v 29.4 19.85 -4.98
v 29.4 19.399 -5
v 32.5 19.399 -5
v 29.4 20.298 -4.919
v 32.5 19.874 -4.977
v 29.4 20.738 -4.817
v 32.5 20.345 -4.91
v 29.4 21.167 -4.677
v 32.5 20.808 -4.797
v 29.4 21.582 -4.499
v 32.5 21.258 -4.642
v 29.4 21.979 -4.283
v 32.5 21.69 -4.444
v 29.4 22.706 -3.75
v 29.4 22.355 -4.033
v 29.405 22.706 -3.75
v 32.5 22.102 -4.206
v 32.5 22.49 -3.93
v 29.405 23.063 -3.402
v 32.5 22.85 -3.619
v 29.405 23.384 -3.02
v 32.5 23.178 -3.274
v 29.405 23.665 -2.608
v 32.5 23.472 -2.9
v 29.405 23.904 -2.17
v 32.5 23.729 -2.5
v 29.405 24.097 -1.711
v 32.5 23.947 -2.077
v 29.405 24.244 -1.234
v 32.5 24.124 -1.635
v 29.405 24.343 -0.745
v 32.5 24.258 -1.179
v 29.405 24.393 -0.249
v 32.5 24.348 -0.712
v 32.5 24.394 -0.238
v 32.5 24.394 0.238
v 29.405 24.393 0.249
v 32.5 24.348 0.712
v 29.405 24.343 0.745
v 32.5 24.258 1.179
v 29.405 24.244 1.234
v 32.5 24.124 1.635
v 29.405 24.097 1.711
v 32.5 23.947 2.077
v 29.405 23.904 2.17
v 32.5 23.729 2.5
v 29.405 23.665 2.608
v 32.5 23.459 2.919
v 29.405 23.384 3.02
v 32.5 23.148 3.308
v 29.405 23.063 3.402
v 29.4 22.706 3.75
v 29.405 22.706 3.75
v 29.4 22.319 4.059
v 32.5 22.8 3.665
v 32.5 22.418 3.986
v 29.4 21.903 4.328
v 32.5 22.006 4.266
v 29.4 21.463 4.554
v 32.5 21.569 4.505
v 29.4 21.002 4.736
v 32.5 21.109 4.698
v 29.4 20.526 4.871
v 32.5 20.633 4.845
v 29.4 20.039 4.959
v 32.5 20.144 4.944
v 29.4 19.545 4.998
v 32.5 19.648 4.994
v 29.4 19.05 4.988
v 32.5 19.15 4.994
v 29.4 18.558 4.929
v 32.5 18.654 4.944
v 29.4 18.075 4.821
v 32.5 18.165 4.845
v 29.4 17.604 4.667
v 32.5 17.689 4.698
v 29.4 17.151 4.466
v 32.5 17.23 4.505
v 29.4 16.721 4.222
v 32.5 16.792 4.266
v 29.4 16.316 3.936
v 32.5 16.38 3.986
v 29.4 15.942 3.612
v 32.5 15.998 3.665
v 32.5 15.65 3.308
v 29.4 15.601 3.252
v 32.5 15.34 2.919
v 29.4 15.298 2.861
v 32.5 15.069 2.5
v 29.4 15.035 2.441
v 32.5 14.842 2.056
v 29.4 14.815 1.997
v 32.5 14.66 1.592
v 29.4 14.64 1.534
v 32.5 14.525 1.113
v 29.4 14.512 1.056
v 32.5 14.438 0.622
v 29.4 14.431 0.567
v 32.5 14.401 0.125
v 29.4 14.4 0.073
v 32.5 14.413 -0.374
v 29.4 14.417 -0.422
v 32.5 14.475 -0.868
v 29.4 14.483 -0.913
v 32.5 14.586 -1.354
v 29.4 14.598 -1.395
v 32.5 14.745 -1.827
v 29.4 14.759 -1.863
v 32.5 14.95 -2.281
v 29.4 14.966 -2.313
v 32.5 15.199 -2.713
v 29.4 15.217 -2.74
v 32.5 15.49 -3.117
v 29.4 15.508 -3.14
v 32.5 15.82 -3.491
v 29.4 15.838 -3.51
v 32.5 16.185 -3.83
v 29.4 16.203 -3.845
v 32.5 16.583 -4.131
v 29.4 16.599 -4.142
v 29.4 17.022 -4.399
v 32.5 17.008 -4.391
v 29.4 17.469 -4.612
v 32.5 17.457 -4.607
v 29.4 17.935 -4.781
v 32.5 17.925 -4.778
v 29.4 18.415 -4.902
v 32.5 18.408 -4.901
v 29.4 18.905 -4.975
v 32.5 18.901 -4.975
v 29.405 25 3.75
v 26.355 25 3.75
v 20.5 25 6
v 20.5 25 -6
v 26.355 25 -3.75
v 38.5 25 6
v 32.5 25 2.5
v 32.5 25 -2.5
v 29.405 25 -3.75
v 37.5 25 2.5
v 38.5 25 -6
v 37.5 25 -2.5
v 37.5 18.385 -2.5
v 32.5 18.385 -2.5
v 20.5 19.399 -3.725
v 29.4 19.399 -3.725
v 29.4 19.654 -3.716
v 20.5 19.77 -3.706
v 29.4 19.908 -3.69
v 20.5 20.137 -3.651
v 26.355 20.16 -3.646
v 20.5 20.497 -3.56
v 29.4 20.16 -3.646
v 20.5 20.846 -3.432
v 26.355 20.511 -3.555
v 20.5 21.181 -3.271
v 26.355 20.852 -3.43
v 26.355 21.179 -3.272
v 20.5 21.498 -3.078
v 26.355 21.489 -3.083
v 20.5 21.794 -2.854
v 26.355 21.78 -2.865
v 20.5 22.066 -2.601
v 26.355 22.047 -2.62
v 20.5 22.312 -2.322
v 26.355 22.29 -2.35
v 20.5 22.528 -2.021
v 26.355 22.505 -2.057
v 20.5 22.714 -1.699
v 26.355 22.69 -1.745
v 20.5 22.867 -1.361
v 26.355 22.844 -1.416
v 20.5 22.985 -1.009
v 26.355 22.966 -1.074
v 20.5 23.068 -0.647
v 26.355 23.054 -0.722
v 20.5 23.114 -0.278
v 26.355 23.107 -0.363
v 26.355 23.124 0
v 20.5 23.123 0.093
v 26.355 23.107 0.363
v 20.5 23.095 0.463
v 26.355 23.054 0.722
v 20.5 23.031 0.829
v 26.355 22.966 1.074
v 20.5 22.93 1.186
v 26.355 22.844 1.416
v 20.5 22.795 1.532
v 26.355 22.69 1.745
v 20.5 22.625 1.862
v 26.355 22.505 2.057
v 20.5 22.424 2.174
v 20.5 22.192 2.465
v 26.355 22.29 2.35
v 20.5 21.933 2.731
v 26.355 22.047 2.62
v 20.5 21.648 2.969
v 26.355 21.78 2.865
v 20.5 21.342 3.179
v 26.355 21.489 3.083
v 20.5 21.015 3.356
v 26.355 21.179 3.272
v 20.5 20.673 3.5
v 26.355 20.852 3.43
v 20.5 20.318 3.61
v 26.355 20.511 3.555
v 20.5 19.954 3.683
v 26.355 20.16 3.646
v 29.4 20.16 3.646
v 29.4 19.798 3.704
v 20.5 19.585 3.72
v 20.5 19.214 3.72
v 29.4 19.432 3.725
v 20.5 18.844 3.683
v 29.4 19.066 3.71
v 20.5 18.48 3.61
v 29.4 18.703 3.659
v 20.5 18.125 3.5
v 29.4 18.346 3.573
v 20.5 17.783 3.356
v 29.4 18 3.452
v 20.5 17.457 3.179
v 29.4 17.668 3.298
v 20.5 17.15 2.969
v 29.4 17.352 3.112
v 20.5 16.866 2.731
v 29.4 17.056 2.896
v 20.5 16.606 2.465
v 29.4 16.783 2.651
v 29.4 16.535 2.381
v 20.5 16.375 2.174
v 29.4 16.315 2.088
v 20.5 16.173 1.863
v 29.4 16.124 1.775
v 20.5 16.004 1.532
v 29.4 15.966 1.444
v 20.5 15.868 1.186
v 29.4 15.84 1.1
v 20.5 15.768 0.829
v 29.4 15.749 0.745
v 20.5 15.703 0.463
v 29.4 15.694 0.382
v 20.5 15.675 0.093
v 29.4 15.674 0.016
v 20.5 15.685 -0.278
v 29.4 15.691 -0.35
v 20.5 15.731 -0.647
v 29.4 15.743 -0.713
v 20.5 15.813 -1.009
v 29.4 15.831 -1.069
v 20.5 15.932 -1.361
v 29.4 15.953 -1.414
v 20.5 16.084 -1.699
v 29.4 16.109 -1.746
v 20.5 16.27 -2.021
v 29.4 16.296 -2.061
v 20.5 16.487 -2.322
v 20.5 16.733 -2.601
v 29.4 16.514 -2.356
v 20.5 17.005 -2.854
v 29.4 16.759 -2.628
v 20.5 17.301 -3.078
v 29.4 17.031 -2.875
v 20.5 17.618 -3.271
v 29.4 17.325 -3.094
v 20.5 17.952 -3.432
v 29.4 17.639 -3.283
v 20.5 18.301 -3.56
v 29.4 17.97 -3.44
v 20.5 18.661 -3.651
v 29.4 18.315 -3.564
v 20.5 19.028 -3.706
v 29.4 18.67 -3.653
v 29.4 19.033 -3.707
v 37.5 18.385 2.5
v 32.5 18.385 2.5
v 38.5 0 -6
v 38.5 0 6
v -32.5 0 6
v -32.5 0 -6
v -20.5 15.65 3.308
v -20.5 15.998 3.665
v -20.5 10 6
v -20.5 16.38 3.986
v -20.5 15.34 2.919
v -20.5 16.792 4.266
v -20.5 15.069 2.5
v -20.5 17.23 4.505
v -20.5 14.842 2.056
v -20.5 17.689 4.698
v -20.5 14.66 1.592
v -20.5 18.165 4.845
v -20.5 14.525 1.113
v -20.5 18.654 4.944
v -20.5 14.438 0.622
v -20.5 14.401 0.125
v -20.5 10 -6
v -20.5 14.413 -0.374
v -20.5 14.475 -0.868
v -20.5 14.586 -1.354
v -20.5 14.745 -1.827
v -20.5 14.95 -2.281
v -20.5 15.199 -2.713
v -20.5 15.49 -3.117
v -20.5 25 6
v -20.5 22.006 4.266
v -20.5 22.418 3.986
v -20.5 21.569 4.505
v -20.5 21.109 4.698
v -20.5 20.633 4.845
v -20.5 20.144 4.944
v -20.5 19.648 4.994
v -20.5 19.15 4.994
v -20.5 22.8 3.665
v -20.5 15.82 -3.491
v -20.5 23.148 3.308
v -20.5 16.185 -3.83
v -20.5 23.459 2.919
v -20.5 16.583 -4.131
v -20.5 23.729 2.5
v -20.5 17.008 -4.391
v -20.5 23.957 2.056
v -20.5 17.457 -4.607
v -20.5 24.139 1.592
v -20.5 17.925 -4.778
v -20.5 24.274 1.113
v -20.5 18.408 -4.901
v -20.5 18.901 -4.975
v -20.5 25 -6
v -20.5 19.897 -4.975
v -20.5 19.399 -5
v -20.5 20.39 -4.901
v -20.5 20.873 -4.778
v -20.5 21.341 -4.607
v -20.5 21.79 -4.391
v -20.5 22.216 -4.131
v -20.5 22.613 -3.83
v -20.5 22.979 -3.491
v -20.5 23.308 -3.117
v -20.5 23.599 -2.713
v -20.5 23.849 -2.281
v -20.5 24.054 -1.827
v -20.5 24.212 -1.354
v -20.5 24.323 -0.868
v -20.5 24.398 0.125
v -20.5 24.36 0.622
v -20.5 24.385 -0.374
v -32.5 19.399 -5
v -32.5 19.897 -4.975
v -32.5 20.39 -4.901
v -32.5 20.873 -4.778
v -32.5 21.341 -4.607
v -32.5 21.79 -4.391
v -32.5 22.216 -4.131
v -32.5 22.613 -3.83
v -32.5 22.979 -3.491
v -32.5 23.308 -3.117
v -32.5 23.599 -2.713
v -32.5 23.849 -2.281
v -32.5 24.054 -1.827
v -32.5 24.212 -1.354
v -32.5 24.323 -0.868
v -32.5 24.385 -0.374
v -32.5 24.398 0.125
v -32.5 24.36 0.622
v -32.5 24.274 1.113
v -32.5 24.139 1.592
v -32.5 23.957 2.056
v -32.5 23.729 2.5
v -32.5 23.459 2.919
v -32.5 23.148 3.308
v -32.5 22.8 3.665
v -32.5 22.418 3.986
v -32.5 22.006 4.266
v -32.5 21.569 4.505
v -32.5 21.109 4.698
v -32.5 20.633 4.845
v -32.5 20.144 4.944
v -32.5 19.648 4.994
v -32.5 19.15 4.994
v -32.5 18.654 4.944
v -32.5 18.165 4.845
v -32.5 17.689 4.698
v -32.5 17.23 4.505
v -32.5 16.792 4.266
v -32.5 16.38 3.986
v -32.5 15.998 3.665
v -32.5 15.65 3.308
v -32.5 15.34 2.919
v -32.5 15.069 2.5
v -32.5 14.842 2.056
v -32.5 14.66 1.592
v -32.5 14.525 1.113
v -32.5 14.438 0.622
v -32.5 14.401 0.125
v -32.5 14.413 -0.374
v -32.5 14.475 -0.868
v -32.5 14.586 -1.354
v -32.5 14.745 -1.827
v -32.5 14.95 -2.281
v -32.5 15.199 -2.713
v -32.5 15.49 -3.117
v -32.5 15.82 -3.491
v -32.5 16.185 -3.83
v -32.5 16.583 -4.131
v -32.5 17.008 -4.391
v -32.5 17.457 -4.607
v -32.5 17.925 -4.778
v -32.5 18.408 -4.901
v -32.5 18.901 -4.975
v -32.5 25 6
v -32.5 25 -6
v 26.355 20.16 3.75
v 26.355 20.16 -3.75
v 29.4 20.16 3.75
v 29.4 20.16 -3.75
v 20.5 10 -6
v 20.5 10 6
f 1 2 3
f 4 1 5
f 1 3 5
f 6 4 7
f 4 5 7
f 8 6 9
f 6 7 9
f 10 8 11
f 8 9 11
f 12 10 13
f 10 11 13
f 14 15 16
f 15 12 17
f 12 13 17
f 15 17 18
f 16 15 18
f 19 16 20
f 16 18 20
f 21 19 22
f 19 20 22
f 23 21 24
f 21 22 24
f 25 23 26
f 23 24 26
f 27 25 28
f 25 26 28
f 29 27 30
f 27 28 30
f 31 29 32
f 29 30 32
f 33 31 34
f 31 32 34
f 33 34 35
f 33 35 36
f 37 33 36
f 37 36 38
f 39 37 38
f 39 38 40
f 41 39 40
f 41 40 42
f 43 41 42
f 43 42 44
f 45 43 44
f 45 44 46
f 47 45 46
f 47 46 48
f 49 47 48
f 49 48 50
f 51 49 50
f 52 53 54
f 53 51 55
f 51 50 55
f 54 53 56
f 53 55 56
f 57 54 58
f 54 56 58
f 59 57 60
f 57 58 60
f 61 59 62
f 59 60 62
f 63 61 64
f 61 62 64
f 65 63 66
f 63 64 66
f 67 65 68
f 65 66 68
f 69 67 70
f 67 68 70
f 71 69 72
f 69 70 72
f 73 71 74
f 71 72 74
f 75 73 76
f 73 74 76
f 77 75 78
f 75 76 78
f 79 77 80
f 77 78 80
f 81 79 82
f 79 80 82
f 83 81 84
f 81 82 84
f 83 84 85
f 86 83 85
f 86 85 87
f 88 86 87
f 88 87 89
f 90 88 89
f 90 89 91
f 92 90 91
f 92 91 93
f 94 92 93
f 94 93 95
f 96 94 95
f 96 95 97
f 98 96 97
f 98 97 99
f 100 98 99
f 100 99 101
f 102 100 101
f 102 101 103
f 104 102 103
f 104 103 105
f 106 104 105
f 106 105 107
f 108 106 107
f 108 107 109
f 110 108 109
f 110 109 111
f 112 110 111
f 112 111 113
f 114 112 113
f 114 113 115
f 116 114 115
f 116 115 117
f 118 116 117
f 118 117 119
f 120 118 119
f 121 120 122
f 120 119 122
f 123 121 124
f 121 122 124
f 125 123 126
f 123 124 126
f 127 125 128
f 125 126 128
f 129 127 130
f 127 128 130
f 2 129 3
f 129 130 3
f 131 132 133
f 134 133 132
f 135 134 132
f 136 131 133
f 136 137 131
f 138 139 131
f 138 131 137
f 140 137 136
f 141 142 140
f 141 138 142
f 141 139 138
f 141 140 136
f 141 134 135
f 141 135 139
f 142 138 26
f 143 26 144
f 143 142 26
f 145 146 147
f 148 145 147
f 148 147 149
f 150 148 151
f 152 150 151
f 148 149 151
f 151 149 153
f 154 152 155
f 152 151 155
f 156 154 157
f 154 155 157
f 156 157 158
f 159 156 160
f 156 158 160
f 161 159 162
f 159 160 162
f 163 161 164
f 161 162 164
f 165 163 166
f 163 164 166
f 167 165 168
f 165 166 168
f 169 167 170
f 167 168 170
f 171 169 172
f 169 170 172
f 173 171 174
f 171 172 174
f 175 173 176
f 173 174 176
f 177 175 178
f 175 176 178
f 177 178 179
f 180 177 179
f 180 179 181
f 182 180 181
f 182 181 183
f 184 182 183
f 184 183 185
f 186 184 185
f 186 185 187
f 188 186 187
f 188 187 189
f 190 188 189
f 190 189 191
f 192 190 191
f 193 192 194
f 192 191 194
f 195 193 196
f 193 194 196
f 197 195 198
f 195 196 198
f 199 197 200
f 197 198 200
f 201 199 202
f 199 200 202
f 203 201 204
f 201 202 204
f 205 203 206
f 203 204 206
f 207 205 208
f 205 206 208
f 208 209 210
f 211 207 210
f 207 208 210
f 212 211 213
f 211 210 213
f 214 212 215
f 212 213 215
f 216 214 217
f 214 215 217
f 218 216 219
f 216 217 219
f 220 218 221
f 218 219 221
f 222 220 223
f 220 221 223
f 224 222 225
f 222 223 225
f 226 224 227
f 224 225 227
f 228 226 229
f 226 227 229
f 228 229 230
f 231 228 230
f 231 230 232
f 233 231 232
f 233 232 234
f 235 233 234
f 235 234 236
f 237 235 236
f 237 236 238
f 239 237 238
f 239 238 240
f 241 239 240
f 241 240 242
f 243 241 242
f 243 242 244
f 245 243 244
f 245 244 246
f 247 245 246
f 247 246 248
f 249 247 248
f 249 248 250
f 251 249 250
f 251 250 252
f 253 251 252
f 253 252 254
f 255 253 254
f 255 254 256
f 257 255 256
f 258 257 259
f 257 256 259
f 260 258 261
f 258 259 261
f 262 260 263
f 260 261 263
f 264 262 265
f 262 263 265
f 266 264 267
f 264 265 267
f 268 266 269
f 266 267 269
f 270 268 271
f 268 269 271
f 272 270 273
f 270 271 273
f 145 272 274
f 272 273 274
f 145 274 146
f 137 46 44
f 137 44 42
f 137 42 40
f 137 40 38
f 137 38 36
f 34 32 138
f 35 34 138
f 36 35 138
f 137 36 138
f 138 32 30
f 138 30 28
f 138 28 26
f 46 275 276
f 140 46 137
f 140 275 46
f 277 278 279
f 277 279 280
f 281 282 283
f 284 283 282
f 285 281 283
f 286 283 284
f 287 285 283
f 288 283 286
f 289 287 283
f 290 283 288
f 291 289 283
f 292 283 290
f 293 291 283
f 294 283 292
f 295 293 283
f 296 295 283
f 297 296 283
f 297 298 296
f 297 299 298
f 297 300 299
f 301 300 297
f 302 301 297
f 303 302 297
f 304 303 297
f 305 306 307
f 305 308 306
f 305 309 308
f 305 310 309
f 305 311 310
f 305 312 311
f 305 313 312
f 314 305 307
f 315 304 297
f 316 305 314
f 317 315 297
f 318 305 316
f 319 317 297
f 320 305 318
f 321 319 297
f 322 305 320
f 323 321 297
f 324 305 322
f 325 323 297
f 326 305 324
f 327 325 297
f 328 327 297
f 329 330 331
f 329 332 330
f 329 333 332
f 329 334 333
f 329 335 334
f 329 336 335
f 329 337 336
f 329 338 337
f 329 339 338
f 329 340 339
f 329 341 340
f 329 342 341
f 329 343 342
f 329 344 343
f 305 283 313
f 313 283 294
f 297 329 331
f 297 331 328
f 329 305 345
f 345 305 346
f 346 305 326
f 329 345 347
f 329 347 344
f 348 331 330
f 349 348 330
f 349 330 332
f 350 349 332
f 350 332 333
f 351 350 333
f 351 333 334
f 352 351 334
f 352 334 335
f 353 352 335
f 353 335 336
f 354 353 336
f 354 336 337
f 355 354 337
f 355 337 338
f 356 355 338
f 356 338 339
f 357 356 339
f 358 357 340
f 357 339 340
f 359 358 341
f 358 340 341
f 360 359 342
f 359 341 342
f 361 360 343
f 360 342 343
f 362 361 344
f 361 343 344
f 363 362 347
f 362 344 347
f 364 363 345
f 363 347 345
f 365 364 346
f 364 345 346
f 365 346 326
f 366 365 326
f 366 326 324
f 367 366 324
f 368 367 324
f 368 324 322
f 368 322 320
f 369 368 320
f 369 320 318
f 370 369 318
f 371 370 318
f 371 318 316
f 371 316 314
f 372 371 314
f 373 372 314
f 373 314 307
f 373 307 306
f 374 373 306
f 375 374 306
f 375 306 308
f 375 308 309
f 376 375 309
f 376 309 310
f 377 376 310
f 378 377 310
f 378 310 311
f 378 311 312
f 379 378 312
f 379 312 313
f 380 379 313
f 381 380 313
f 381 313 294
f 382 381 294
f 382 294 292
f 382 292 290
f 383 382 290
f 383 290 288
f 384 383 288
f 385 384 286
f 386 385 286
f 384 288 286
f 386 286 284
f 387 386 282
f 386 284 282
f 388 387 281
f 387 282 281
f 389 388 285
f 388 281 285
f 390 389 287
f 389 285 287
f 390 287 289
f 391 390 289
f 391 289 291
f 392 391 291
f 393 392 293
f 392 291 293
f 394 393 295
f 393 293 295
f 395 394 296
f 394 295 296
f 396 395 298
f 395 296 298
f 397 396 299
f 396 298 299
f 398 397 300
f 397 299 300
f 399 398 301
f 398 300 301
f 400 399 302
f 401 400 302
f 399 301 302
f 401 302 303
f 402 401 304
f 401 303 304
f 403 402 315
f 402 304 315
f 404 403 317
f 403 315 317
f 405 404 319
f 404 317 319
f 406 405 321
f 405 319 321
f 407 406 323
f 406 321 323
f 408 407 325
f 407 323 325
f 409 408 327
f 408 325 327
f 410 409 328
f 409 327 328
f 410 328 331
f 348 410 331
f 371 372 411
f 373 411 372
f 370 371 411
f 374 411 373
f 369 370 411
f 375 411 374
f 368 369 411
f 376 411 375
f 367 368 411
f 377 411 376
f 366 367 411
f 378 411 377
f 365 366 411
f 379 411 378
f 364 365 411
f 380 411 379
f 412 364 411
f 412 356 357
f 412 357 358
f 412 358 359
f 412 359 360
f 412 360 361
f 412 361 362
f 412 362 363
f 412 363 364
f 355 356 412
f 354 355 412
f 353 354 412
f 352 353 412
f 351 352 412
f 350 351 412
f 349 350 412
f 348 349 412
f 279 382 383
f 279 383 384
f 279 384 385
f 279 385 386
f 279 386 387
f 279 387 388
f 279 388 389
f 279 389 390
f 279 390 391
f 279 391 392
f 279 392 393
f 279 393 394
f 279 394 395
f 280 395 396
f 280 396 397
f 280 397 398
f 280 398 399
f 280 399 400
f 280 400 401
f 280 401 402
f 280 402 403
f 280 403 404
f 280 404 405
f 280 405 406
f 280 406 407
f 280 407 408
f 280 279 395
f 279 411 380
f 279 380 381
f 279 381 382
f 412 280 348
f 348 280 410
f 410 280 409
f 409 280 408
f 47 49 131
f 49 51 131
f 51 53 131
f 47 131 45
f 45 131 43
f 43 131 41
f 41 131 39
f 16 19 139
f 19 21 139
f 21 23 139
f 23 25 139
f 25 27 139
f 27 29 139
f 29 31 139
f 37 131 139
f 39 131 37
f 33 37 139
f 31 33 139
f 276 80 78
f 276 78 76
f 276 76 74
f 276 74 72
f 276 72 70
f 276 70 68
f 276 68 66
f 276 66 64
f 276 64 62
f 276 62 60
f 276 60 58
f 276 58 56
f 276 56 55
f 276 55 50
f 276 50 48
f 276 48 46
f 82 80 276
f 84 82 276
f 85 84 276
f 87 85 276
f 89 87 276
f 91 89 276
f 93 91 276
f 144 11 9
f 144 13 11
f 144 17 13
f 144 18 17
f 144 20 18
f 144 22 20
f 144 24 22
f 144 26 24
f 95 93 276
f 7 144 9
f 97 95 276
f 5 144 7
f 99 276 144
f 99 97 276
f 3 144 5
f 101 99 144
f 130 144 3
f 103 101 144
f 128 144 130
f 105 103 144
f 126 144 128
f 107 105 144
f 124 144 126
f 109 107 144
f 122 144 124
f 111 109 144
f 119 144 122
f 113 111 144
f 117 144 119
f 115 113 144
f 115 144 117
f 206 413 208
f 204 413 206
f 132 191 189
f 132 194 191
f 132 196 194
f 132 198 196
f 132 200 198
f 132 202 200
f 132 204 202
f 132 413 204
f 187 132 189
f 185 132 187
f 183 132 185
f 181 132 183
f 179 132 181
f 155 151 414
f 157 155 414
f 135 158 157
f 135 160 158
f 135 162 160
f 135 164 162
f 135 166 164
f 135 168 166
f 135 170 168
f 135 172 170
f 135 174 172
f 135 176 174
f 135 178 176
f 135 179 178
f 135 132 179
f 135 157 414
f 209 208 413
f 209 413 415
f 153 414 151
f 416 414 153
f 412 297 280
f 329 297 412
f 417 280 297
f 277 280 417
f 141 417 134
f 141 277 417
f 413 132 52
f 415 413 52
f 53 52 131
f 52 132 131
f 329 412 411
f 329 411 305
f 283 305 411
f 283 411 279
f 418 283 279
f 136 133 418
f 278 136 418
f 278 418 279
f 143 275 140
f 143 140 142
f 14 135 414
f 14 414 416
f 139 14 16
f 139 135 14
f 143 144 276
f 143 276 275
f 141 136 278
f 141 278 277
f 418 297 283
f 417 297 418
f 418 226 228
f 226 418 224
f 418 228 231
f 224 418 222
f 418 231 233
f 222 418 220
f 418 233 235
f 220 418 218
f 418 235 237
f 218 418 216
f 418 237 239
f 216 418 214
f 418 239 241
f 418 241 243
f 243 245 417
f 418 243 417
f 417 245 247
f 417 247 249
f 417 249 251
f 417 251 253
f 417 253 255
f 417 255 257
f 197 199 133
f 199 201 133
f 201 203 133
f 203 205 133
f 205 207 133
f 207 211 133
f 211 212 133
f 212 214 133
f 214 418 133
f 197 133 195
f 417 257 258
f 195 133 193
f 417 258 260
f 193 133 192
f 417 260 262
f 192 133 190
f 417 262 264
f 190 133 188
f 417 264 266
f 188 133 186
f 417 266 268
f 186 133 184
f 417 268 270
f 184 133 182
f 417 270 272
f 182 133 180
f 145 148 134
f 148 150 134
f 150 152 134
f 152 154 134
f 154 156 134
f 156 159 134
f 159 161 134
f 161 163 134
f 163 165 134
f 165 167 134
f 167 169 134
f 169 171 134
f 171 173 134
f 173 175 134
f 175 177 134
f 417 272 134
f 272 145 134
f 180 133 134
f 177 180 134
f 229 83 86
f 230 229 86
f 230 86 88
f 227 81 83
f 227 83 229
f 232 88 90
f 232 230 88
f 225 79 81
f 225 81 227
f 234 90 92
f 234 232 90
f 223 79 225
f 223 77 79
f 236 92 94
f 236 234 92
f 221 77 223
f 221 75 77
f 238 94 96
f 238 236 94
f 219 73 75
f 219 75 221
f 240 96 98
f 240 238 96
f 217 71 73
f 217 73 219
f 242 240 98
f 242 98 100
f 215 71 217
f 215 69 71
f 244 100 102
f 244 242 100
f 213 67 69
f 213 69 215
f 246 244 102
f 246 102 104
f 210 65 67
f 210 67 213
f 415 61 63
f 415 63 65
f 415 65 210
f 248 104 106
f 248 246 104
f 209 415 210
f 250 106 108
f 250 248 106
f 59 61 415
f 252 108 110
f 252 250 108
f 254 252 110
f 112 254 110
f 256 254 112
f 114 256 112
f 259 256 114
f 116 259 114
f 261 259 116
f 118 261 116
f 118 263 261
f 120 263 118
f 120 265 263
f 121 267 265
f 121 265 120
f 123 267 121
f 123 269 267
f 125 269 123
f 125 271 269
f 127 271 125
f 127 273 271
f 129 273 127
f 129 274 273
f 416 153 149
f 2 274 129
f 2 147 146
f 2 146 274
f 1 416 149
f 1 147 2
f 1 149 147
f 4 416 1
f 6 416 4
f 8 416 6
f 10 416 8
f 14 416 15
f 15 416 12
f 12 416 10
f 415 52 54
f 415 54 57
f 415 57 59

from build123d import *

# Parameters (mm, degrees)
SKETCH1_W           = 65
SKETCH1_H           = 12
BOSS_EXTRUDE1_DEPTH = 25
SKETCH2_R           = 5
CUT_EXTRUDE1_DEPTH  = 70.899928469
SKETCH3_W           = 41
SKETCH3_H           = 12
CUT_EXTRUDE2_DEPTH  = 15
BOSS_EXTRUDE2_START = -3.1
SKETCH5_R           = 5
SKETCH5_R_2         = 3.725
BOSS_EXTRUDE2_DEPTH = 8.9
SKETCH4_W           = 3.0500066
SKETCH4_H           = 7.5
CUT_EXTRUDE3_DEPTH  = 4.84
BOSS_EXTRUDE5_START = 6
BOSS_EXTRUDE5_DEPTH = 6
SKETCH13_W          = 1
SKETCH13_H          = 5
BOSS_EXTRUDE6_DEPTH = 11.106510599
SKETCH14_W          = 5
SKETCH14_H          = 5
BOSS_EXTRUDE7_DEPTH = 4.491999938


with BuildPart() as part:
    # Sketch1 → Boss-Extrude1 (new body)
    with BuildSketch(Plane(origin=(0, 0, 0), x_dir=(1, 0, 0), z_dir=(0, 1, 0))):
        Rectangle(SKETCH1_W, SKETCH1_H)
    extrude(amount=BOSS_EXTRUDE1_DEPTH)

    # Sketch2 → Cut-Extrude1 (cut, through all)
    with BuildSketch(Plane(origin=(32.5, 0, 0), x_dir=(0, 0, -1), z_dir=(1, 0, 0))):
        with Locations((0, 19.399202688)):
            Circle(SKETCH2_R)
    extrude(amount=-CUT_EXTRUDE1_DEPTH, mode=Mode.SUBTRACT)

    # Sketch3 → Cut-Extrude2 (cut)
    with BuildSketch(Plane(origin=(0, 25, 0), x_dir=(1, 0, 0), z_dir=(0, 1, 0))):
        Rectangle(SKETCH3_W, SKETCH3_H)
    extrude(amount=-CUT_EXTRUDE2_DEPTH, mode=Mode.SUBTRACT)

    # Sketch5 → Boss-Extrude2 (add)
    with BuildSketch(Plane(origin=(32.5, 0, 0), x_dir=(0, 0, -1), z_dir=(1, 0, 0)).offset(BOSS_EXTRUDE2_START)):
        with Locations((0, 19.399202688)):
            Circle(SKETCH5_R)
        with Locations((0, 19.399202688)):
            Circle(SKETCH5_R_2, mode=Mode.SUBTRACT)
    extrude(amount=-BOSS_EXTRUDE2_DEPTH)

    # Sketch4 → Cut-Extrude3 (cut)
    with BuildSketch(Plane(origin=(0, 25, 0), x_dir=(1, 0, 0), z_dir=(0, 1, 0))):
        with Locations((27.88, 0)):
            Rectangle(SKETCH4_W, SKETCH4_H)
    extrude(amount=-CUT_EXTRUDE3_DEPTH, mode=Mode.SUBTRACT)

    # Sketch12 → Boss-Extrude5 (add)
    with BuildSketch(Plane(origin=(32.5, 0, 0), x_dir=(0, 0, -1), z_dir=(1, 0, 0)).offset(BOSS_EXTRUDE5_START)):
        with BuildLine():
            Line((-2.5, 25), (-6, 25))
            Line((-6, 25), (-6, 0))
            Line((-6, 0), (6, 0))
            Line((6, 0), (6, 25))
            Line((6, 25), (2.5, 25))
            Line((2.5, 25), (2.5, 23.729329707))
            ThreePointArc((2.5, 23.729329707), (4.330127019, 21.899202688), (5, 19.399202688))
            ThreePointArc((5, 19.399202688), (4.330127019, 16.899202688), (2.5, 15.069075669))
            Line((2.5, 15.069075669), (2.5, 13.893489401))
            Line((2.5, 13.893489401), (-2.5, 13.893489401))
            Line((-2.5, 13.893489401), (-2.5, 15.069075669))
            ThreePointArc((-2.5, 15.069075669), (-5, 19.399202688), (-2.5, 23.729329707))
            Line((-2.5, 23.729329707), (-2.5, 25))
        make_face()
        with BuildLine():
            Line((-2.5, 15.069075669), (-2.5, 23.729329707))
            ThreePointArc((-2.5, 23.729329707), (-5, 19.399202688), (-2.5, 15.069075669))
        make_face()
        with BuildLine():
            ThreePointArc((5, 19.399202688), (4.330127019, 21.899202688), (2.5, 23.729329707))
            Line((2.5, 23.729329707), (2.5, 15.069075669))
            ThreePointArc((2.5, 15.069075669), (4.330127019, 16.899202688), (5, 19.399202688))
        make_face()
    extrude(amount=-BOSS_EXTRUDE5_DEPTH)

    # Sketch13 → Boss-Extrude6 (add)
    with BuildSketch(Plane(origin=(0, 25, 0), x_dir=(1, 0, 0), z_dir=(0, 1, 0))):
        with Locations((38, 0)):
            Rectangle(SKETCH13_W, SKETCH13_H)
    extrude(amount=-BOSS_EXTRUDE6_DEPTH)

    # Sketch14 → Boss-Extrude7 (add)
    with BuildSketch(Plane(origin=(0, 13.893489401, 0), x_dir=(1, 0, 0), z_dir=(0, 1, 0))):
        with Locations((35, 0)):
            Rectangle(SKETCH14_W, SKETCH14_H)
    extrude(amount=BOSS_EXTRUDE7_DEPTH)


solid = part.part
